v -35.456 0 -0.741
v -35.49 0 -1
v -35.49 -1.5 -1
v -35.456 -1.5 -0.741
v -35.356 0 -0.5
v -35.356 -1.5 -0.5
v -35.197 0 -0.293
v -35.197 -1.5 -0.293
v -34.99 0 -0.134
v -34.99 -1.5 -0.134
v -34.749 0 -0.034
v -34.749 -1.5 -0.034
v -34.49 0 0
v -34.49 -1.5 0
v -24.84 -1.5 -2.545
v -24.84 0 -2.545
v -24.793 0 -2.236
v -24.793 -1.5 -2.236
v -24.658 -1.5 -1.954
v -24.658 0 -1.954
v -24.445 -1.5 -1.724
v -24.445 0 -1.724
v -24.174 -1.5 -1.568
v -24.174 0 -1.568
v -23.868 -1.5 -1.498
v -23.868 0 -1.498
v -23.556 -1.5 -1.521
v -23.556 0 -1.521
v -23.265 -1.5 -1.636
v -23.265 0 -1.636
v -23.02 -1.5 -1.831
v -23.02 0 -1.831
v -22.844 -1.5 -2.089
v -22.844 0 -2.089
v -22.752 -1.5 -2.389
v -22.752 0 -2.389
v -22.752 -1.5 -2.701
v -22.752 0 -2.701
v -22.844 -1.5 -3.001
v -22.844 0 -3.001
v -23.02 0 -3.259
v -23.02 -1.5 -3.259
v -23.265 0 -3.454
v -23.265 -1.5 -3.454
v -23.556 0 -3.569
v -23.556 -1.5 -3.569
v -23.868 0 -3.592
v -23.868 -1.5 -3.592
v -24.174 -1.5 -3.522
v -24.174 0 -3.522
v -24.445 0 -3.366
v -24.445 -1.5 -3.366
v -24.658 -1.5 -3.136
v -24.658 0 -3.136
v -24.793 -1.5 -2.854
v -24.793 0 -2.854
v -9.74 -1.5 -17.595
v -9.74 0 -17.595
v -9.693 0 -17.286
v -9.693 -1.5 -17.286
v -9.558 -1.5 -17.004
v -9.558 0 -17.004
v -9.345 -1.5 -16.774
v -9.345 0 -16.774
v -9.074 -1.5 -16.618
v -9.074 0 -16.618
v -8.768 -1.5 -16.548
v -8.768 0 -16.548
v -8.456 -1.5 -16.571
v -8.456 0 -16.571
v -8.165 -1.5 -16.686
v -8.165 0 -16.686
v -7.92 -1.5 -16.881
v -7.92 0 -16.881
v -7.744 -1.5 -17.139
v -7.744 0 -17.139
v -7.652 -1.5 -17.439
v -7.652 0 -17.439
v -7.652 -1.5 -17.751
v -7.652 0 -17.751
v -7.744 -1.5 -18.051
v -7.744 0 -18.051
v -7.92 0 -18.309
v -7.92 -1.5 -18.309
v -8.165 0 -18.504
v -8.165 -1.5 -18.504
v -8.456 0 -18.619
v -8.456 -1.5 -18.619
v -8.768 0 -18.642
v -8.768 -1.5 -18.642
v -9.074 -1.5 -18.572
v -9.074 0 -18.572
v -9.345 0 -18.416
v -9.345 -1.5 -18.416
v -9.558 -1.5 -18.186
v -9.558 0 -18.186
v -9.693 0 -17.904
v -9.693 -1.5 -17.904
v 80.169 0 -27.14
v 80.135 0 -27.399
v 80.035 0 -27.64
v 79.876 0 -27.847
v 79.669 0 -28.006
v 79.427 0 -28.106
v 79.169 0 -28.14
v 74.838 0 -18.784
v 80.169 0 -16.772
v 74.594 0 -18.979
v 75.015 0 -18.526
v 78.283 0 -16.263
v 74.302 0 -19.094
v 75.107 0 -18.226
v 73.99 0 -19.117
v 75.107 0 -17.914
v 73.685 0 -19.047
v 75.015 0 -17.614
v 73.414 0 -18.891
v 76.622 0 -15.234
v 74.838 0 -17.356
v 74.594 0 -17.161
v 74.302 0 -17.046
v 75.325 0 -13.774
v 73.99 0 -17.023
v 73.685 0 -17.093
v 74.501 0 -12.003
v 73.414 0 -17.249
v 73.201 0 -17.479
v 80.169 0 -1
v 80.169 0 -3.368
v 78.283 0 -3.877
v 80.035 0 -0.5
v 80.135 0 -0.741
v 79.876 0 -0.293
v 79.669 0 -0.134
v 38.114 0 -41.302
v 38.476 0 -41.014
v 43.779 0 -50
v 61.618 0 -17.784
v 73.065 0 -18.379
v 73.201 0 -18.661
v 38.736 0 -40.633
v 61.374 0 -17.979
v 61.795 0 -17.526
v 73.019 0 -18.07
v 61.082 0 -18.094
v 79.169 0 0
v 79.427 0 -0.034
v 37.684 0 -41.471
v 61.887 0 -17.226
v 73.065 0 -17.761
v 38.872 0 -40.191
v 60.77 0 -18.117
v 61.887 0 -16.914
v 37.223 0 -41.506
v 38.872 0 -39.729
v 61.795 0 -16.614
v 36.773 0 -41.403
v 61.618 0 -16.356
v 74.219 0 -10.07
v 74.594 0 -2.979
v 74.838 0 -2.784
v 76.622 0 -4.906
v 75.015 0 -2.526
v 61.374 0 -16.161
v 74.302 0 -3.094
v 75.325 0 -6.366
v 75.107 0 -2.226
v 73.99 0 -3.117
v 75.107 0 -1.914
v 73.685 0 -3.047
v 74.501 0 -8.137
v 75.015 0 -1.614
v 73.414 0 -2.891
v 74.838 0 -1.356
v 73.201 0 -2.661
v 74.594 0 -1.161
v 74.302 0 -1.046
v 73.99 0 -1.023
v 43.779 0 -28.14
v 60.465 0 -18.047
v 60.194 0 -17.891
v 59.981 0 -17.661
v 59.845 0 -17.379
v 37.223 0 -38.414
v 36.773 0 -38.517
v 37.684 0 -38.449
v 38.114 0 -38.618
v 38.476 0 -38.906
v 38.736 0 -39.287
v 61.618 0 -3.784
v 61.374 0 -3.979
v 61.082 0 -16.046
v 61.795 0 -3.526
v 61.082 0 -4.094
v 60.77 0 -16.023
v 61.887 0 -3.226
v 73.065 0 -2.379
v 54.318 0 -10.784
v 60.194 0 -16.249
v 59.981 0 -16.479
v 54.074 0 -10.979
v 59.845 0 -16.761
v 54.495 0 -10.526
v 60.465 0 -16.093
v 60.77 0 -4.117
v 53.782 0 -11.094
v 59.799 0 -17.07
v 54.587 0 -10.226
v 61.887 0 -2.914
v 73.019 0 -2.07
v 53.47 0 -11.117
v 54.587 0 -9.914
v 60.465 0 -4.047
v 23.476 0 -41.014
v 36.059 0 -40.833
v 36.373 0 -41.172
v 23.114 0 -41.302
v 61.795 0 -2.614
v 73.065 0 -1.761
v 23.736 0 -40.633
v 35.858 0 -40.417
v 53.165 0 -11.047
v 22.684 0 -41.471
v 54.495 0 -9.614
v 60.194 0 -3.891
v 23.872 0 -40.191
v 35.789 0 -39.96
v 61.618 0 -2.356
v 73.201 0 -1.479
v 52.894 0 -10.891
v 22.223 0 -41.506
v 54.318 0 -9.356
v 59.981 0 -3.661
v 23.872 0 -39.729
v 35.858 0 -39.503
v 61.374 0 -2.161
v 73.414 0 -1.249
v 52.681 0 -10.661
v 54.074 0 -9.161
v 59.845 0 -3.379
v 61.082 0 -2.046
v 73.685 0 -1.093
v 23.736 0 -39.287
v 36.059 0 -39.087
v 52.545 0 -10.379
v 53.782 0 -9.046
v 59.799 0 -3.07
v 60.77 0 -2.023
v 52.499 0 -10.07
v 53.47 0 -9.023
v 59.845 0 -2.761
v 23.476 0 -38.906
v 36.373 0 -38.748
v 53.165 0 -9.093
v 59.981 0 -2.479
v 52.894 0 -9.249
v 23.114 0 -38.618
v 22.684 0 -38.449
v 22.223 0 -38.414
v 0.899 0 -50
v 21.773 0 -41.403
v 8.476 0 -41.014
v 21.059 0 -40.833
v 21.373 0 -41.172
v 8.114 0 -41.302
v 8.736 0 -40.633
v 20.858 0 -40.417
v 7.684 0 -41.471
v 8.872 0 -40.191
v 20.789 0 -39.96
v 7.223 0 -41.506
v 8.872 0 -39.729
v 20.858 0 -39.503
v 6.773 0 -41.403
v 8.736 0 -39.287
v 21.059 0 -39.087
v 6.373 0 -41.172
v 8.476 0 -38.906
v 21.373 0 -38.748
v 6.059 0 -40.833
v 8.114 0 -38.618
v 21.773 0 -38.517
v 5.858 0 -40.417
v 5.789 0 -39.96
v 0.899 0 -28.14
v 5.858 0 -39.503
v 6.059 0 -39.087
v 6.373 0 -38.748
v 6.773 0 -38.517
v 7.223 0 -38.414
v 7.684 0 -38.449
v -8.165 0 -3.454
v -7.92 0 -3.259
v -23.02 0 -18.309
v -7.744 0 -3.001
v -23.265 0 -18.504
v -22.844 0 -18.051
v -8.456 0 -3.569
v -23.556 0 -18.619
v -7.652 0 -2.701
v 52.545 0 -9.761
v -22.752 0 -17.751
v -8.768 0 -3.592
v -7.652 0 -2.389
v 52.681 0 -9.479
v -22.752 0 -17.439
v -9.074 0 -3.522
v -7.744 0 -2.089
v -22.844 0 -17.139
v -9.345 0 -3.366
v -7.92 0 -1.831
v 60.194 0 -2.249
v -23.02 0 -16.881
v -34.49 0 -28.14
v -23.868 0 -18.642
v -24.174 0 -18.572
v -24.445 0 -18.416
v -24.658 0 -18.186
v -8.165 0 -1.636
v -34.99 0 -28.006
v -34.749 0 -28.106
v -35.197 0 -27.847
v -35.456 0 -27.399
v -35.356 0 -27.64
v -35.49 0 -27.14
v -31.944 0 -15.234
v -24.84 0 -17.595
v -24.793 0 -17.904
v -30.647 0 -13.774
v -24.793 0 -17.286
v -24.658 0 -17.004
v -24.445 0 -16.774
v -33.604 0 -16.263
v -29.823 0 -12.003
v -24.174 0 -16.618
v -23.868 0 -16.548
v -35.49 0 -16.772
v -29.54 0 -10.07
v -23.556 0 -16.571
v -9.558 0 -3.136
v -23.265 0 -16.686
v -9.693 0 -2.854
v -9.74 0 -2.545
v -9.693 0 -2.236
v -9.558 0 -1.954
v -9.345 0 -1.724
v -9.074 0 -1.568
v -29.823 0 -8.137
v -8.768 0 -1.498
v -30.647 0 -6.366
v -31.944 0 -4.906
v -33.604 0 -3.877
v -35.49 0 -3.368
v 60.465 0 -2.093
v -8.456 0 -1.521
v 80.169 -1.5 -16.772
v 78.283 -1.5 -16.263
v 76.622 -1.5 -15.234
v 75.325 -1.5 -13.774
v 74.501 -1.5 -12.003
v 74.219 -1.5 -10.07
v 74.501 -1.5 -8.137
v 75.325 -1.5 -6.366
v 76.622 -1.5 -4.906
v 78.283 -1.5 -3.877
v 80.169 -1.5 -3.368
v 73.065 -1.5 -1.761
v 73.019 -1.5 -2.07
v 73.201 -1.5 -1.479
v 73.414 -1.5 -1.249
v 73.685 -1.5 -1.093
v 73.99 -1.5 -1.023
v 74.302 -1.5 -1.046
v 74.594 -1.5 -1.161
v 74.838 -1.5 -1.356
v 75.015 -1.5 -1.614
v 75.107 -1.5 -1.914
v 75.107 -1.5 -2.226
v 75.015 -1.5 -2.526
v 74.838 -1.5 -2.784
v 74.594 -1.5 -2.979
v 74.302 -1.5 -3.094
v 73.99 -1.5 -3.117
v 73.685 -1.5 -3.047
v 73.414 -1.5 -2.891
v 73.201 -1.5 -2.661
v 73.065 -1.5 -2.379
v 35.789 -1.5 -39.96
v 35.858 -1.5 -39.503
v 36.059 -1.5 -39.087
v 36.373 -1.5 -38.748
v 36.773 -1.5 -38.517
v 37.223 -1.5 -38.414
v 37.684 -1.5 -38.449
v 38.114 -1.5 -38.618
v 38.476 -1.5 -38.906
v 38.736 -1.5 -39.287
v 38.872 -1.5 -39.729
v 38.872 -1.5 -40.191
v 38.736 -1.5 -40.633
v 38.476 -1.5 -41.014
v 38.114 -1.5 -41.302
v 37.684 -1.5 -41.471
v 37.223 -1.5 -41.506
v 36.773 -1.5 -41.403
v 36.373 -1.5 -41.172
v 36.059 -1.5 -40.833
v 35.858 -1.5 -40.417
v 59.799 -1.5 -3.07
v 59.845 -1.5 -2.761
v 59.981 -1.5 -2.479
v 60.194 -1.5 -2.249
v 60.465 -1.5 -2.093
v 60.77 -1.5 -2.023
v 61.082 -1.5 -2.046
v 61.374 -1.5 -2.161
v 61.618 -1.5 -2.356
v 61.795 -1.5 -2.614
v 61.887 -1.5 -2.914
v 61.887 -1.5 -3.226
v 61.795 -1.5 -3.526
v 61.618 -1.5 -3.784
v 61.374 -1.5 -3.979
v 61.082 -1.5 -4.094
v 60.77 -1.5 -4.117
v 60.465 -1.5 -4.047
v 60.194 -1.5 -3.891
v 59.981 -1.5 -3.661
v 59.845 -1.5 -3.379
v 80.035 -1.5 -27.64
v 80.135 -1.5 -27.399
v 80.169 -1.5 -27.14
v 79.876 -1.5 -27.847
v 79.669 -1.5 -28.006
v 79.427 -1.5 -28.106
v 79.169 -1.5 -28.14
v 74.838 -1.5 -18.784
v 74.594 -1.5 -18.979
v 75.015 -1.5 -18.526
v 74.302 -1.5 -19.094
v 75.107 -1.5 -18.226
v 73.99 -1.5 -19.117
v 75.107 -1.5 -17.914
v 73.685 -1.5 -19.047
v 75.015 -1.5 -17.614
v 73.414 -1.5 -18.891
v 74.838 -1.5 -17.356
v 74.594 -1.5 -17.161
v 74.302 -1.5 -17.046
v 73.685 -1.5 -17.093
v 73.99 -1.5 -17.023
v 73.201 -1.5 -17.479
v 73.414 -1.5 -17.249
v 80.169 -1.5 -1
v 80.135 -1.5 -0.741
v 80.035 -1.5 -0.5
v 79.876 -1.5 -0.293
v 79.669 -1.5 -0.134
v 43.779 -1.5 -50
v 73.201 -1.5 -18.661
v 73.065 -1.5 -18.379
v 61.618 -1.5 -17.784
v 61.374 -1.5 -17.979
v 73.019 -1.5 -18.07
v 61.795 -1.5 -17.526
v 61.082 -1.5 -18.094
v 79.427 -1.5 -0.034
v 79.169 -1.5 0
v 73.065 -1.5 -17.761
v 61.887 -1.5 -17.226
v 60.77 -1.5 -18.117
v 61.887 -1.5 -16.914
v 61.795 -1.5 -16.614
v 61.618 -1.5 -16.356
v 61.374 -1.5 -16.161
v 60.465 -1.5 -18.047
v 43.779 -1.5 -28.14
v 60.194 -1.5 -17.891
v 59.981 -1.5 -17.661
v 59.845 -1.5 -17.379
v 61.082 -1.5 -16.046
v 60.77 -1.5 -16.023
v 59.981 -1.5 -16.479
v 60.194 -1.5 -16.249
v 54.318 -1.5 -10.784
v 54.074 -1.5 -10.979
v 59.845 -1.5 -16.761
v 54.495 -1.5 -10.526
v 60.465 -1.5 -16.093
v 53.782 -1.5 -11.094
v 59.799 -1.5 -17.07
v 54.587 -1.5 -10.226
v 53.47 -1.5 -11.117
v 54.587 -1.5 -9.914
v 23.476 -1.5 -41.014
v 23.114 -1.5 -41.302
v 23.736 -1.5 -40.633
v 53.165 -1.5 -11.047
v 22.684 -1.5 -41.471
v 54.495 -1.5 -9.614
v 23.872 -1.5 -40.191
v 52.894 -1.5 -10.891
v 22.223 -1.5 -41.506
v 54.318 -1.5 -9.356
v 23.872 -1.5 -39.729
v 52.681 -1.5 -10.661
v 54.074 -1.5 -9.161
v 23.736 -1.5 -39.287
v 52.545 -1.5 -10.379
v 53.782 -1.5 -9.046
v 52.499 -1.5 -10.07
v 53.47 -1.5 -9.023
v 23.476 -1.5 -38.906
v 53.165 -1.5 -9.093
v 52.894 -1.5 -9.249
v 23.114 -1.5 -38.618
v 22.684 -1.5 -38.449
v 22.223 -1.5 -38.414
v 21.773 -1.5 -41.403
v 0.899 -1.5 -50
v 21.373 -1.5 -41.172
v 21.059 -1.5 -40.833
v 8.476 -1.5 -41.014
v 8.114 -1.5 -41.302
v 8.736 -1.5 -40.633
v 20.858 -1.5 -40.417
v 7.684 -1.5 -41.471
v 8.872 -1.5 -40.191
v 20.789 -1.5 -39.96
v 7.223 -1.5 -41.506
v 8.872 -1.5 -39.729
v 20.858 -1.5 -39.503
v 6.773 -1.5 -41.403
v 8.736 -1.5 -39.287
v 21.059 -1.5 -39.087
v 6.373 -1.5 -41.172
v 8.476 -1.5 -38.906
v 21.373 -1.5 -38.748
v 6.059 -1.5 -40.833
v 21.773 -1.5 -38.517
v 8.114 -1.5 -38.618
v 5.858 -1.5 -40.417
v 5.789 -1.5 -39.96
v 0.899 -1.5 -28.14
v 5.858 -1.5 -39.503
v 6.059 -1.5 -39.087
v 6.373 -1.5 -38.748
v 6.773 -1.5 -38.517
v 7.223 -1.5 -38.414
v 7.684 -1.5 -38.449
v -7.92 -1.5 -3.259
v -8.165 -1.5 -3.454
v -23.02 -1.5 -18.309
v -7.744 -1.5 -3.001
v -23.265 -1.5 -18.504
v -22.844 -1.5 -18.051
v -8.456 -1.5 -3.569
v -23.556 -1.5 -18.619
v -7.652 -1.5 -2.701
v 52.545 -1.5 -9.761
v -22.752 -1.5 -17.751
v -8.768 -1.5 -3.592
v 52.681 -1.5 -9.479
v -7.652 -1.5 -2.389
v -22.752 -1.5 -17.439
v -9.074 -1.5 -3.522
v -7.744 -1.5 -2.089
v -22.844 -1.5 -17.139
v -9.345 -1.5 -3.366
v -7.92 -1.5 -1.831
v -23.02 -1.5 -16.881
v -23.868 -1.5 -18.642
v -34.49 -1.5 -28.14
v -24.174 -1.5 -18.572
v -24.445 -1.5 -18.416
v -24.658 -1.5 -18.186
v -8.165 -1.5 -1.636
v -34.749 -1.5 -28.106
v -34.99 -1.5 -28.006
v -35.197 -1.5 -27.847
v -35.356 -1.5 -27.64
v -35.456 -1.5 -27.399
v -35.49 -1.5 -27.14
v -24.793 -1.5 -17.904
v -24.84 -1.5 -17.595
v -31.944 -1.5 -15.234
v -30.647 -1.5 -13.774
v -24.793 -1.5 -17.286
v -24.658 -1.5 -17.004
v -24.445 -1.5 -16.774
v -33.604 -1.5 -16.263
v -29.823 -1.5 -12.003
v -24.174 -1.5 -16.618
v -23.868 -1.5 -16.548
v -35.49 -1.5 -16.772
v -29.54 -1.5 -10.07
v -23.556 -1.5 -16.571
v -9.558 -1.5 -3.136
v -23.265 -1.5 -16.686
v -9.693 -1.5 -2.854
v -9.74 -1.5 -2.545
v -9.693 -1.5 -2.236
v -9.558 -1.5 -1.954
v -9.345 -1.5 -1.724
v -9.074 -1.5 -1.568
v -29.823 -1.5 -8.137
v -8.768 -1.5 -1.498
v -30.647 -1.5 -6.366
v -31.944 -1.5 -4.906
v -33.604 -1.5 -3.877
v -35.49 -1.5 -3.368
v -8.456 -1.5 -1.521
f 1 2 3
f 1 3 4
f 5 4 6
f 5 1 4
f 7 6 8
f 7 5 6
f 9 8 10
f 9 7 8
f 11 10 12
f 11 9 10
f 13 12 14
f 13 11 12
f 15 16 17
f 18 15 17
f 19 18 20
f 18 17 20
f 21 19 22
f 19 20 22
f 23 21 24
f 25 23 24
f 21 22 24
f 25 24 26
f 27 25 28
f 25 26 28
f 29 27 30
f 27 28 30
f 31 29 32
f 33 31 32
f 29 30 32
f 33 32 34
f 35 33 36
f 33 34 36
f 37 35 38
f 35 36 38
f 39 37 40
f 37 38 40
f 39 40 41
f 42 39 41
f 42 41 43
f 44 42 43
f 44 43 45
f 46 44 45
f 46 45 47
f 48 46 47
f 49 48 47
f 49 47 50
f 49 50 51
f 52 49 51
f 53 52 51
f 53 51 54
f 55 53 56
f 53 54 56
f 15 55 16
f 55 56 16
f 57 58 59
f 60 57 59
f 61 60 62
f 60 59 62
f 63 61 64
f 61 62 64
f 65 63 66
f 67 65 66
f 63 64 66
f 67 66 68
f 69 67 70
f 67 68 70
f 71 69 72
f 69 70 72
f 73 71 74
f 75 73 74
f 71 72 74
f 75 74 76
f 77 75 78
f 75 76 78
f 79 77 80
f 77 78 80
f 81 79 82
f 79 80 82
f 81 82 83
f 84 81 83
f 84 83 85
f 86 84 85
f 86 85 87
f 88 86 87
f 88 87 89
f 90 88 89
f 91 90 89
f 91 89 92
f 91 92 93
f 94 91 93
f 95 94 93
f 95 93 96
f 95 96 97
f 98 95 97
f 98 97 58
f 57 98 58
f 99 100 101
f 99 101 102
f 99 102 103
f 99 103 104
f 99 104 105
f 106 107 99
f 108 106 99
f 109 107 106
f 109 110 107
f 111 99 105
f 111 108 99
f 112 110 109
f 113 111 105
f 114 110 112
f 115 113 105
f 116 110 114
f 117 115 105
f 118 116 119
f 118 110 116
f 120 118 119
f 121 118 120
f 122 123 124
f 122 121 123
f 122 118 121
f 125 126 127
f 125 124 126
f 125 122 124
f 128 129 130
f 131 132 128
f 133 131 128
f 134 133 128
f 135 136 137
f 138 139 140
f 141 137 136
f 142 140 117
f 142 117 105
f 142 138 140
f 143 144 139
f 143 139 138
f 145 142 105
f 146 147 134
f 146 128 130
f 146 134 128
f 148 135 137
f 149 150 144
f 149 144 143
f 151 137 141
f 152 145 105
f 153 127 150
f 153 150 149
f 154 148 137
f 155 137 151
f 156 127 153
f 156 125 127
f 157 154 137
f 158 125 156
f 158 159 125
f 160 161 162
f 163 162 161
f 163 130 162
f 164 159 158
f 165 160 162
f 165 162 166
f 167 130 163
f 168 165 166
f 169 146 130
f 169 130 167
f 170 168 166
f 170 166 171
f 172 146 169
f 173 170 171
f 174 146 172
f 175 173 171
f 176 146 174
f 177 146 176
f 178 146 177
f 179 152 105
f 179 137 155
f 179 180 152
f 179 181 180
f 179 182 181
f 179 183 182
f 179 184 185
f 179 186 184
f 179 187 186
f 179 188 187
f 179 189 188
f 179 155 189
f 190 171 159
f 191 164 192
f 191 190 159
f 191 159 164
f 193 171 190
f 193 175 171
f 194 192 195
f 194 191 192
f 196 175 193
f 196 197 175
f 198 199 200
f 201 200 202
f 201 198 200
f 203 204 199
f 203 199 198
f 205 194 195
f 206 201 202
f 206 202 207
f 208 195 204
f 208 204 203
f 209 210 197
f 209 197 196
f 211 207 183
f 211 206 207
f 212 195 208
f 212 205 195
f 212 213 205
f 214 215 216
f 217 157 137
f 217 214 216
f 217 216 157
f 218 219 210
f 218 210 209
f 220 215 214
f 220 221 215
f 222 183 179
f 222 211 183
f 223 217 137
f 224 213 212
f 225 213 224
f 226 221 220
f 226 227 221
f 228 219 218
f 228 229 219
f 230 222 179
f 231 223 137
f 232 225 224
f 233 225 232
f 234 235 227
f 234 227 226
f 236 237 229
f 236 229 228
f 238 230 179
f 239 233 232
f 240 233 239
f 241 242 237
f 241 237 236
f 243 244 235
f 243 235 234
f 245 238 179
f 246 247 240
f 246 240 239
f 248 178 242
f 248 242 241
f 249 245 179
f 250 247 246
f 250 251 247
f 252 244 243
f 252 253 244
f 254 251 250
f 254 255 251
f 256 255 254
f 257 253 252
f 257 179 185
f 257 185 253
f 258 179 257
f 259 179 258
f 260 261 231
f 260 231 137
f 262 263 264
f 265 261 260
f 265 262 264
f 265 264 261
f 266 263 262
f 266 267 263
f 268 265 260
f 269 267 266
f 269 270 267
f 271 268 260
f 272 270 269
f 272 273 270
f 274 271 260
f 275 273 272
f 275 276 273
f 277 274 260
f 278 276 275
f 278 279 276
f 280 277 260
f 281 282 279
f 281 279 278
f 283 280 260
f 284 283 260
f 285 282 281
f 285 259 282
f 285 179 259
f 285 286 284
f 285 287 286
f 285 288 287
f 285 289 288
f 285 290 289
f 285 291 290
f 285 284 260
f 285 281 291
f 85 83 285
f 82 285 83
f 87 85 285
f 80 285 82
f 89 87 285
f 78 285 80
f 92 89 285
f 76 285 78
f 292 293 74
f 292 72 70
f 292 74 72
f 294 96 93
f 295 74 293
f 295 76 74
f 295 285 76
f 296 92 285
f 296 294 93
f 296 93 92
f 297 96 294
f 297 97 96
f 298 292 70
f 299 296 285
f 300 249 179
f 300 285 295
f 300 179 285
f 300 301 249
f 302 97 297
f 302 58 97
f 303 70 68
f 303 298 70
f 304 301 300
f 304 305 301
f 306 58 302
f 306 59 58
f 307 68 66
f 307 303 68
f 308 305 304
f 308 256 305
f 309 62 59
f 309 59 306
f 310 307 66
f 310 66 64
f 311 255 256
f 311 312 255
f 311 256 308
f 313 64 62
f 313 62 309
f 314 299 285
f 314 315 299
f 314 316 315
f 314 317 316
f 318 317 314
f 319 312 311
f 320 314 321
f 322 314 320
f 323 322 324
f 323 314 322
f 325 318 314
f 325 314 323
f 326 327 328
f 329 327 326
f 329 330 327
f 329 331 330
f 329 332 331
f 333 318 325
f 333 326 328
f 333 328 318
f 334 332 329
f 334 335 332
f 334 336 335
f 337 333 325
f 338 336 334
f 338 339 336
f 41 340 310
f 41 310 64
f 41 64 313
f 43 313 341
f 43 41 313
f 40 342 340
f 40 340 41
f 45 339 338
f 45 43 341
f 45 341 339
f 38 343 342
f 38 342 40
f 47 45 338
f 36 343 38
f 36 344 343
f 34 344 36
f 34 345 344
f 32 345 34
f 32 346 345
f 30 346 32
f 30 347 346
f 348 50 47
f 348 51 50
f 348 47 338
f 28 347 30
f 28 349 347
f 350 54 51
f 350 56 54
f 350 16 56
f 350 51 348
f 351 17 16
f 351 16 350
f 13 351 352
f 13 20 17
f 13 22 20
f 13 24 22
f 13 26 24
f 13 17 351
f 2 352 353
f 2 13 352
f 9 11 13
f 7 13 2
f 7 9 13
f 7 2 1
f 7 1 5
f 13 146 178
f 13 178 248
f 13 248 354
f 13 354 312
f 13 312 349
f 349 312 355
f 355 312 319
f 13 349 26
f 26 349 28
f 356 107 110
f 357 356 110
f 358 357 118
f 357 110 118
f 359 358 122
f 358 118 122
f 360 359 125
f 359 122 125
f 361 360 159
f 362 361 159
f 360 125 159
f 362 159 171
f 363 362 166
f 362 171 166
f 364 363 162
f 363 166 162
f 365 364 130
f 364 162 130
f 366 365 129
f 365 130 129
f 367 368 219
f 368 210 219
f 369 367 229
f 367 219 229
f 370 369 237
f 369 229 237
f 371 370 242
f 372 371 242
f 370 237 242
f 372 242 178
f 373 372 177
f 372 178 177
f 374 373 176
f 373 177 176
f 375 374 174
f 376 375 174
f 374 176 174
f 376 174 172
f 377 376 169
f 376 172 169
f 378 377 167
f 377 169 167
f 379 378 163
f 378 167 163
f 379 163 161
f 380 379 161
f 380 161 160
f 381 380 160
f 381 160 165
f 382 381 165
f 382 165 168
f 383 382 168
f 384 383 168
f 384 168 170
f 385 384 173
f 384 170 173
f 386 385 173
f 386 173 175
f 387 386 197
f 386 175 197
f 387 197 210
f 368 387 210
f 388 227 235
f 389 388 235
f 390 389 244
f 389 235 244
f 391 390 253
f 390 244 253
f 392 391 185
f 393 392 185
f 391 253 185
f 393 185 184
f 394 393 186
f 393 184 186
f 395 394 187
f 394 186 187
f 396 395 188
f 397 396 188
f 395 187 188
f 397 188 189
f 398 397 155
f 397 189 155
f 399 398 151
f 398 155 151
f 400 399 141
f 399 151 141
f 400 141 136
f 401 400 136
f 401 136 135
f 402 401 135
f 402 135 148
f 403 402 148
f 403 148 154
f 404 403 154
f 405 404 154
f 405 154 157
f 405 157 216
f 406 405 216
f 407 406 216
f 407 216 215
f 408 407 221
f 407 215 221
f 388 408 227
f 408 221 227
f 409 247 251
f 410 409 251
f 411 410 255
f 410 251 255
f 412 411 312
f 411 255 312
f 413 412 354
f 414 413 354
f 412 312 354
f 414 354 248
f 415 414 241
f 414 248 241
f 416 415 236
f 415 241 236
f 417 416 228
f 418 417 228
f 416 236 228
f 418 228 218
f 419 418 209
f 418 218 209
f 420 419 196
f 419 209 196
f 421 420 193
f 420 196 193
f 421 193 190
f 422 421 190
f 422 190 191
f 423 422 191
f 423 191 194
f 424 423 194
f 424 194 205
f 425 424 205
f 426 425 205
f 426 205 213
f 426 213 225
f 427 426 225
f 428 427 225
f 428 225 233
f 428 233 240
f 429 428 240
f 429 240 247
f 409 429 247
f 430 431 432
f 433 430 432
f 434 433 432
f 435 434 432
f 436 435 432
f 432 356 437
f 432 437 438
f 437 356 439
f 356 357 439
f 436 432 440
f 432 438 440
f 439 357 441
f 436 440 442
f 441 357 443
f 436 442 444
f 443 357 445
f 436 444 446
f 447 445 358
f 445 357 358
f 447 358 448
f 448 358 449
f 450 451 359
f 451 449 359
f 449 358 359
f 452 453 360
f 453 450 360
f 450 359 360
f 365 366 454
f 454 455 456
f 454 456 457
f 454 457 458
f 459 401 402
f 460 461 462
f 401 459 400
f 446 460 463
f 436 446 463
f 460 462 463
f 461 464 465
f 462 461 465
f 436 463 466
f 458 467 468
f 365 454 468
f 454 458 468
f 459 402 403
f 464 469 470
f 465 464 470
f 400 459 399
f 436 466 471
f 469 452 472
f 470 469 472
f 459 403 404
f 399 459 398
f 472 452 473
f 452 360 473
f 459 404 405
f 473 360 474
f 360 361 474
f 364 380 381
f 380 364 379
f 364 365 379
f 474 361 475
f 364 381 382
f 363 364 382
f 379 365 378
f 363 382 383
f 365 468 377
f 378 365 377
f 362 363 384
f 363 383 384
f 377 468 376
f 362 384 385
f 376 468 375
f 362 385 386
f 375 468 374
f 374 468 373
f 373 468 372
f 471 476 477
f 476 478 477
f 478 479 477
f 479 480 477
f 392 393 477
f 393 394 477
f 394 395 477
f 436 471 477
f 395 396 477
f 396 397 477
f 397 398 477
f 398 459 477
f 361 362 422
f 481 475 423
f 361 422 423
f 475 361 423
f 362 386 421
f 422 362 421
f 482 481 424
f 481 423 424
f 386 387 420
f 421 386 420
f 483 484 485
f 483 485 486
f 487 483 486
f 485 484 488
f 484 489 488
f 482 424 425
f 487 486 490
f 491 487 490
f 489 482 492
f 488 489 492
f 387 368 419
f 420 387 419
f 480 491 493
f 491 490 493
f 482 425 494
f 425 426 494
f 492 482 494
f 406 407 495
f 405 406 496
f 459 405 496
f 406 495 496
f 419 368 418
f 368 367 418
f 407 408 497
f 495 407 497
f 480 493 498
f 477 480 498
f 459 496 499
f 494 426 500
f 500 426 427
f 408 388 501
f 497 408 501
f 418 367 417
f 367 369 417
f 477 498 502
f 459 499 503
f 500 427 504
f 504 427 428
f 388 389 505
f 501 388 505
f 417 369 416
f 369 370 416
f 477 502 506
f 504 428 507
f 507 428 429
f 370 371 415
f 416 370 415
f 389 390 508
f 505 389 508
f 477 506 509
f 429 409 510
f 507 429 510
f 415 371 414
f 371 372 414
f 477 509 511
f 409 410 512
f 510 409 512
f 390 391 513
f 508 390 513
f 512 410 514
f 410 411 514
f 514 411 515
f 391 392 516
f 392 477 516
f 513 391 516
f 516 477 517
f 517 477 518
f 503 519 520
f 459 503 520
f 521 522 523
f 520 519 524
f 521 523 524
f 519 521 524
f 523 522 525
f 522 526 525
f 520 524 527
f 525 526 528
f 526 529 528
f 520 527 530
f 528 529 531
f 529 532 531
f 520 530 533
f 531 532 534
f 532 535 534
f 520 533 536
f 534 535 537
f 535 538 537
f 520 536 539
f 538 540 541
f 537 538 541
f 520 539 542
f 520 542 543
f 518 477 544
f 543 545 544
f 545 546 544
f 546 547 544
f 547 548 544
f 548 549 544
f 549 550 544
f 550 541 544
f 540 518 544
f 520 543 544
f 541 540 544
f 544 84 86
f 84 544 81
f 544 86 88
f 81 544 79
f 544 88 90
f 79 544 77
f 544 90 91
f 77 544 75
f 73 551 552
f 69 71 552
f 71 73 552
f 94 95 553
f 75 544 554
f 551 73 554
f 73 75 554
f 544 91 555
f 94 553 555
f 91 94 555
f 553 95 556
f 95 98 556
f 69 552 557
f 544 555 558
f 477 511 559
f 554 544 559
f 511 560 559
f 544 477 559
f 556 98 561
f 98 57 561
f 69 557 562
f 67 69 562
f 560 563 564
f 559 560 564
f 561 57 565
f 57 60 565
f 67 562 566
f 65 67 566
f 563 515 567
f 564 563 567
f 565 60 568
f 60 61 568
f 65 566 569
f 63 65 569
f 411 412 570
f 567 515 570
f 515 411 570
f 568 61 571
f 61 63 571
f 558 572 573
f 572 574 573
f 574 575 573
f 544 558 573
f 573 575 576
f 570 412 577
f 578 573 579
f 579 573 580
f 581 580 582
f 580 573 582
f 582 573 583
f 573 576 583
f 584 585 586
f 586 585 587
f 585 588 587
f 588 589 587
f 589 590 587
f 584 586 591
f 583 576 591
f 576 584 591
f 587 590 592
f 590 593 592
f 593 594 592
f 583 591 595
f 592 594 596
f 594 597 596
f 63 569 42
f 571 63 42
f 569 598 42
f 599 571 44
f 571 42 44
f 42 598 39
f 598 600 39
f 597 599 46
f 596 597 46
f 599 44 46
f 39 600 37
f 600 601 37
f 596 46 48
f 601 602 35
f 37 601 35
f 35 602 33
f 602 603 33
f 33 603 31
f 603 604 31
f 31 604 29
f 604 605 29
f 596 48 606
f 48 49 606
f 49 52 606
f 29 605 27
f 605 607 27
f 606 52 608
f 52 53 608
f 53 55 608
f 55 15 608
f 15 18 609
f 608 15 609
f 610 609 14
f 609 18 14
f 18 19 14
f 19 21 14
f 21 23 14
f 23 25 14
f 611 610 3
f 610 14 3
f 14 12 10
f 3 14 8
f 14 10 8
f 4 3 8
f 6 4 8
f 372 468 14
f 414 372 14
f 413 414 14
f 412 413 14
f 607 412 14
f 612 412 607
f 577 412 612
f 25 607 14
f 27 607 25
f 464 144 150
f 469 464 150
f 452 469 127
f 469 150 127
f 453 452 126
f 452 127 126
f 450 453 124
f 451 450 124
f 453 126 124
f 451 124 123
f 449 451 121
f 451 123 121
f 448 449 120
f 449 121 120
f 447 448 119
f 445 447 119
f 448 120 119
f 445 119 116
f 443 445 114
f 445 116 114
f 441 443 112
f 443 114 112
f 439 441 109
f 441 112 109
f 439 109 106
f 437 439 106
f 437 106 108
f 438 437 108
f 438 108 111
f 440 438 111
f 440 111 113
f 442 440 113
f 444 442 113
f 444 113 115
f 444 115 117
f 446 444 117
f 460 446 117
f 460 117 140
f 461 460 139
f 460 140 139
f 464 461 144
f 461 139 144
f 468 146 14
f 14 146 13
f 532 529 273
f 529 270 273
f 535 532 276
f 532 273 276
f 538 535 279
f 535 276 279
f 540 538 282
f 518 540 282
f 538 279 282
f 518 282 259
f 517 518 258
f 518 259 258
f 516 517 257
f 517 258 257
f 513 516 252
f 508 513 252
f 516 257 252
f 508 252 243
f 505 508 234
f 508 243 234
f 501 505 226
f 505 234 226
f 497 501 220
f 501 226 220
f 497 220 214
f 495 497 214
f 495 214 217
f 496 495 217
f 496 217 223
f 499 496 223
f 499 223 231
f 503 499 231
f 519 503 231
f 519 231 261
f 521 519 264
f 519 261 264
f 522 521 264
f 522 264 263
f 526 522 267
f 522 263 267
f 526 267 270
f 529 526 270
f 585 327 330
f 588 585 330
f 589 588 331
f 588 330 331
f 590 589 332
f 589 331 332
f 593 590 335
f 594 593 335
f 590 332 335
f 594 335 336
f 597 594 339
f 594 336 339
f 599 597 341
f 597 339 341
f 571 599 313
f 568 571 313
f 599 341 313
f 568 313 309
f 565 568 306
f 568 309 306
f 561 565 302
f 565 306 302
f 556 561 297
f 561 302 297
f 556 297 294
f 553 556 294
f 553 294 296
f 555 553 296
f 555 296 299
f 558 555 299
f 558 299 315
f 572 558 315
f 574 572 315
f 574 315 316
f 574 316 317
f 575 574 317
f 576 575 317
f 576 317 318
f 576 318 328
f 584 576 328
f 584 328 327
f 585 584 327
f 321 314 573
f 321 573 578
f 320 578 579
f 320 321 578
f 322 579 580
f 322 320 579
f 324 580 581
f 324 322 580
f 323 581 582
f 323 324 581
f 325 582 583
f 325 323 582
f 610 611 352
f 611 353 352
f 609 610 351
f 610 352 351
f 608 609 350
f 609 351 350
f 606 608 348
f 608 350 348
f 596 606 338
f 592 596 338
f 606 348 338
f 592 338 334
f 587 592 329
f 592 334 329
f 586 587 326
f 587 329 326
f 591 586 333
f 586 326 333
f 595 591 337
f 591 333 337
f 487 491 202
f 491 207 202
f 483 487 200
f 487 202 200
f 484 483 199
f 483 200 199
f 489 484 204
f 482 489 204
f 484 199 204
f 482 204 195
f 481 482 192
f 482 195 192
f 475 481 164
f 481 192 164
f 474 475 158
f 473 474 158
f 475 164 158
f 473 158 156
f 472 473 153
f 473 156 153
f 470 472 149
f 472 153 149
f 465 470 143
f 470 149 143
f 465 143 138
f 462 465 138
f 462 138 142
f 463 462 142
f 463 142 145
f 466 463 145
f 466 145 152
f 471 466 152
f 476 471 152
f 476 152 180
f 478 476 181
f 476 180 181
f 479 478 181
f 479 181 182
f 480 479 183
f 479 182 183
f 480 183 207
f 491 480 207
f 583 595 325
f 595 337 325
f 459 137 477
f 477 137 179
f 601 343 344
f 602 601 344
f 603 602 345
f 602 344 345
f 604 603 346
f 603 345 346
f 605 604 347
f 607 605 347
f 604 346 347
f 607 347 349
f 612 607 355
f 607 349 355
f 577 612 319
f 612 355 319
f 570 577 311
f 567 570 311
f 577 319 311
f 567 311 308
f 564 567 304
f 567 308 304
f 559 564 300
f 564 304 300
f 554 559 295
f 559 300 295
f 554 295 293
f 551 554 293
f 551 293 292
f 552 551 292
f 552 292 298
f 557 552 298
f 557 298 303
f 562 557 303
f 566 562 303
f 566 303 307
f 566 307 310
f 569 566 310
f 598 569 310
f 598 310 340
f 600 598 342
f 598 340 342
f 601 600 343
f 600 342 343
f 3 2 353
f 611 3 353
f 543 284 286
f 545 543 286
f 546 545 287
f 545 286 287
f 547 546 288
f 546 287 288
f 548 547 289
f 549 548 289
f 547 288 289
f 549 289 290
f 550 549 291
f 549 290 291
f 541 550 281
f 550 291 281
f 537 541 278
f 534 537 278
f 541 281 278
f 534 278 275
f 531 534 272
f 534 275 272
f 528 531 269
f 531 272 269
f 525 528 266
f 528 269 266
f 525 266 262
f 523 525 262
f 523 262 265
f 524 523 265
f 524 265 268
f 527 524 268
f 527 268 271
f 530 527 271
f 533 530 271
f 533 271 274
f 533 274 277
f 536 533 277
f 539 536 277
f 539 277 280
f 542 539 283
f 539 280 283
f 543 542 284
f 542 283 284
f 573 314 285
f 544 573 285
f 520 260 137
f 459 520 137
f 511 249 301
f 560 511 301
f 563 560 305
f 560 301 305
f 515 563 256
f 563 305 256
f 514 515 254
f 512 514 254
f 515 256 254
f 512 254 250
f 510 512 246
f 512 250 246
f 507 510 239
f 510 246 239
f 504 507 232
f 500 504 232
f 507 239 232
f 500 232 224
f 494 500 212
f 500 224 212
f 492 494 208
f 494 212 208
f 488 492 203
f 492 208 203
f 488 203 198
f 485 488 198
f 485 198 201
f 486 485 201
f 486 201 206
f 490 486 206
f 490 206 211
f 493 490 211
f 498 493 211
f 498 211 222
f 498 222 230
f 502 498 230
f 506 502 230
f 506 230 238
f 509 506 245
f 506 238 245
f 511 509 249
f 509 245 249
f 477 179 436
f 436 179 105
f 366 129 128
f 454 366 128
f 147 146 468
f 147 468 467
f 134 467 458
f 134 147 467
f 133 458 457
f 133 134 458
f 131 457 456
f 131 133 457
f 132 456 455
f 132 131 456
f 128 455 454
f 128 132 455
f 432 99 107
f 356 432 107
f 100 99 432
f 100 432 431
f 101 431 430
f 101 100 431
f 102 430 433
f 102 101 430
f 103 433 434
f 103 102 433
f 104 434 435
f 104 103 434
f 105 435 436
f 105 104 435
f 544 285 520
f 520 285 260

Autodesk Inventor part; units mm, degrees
ref_plane "YZ Plane" through (0, 0, 0) normal (1, 0, 0) x (0, 1, 0)
ref_plane "XZ Plane" through (0, 0, 0) normal (0, 1, 0) x (-1, 0, 0)
ref_plane "XY Plane" through (0, 0, 0) normal (0, 0, 1) x (1, 0, 0)
sketch "Sketch1" plane through (0, 0, 0) normal (0, 1, 0) x (-1, 0, 0)
  line L0 (-44.2289, 0) -> (-44.2289, -28.14)
  line L1 (-0.4496, -28.14) -> (-0.4496, 0)
  circle A0 centre (23.79, -17.595) radius 1.05
  circle A1 centre (23.79, -2.545) radius 1.05
  circle A2 centre (8.69, -17.595) radius 1.05
  circle A3 centre (8.69, -2.545) radius 1.05
  circle A4 centre (-53.5486, -10.07) radius 1.05
  circle A5 centre (-60.8486, -17.07) radius 1.05
  circle A6 centre (-60.8486, -3.07) radius 1.05
  circle A7 centre (-74.0686, -18.07) radius 1.05
  circle A8 centre (-74.0686, -2.07) radius 1.05
  circle A9 centre (-37.3393, -39.96) radius 1.55
  circle A10 centre (-22.3393, -39.96) radius 1.55
  circle A11 centre (-7.3393, -39.96) radius 1.55
  arc A12 (35.49, -3.3676) -> (35.49, -16.7724) centre (36.29, -10.07) ccw
  line L2 (35.49, -1) -> (35.49, -3.3676)
  arc A13 (-80.1686, -16.7724) -> (-80.1686, -3.3676) centre (-80.9686, -10.07) ccw
  line L3 (-80.1686, -27.14) -> (-80.1686, -16.7724)
  arc A14 (-80.1686, -27.14) -> (-79.1686, -28.14) centre (-79.1686, -27.14) ccw
  line L4 (-43.7793, -28.14) -> (-79.1686, -28.14)
  line L5 (-43.7793, -50) -> (-43.7793, -28.14)
  line L6 (-0.8993, -50) -> (-43.7793, -50)
  line L7 (-0.8993, -28.14) -> (-0.8993, -50)
  line L8 (34.49, -28.14) -> (-0.8993, -28.14)
  arc A15 (34.49, -28.14) -> (35.49, -27.14) centre (34.49, -27.14) ccw
  line L9 (35.49, -16.7724) -> (35.49, -27.14)
  arc A16 (35.49, -1) -> (34.49, 0) centre (34.49, -1) ccw
  line L10 (-79.1686, 0) -> (34.49, 0)
  arc A17 (-79.1686, 0) -> (-80.1686, -1) centre (-79.1686, -1) ccw
  line L11 (-80.1686, -3.3676) -> (-80.1686, -1)
  line L12 (-44.6786, -28.14) -> (-44.6786, 0)
  line L13 (-43.7793, 0) -> (-43.7793, -28.14)
  line L14 (-0.8993, -28.14) -> (-0.8993, 0)
  line L15 (0, 0) -> (0, -28.14)
extrude "Extrusion1" add sketch "Sketch1" against normal blind 1.5
properties part number "axis_22_top_frame"
